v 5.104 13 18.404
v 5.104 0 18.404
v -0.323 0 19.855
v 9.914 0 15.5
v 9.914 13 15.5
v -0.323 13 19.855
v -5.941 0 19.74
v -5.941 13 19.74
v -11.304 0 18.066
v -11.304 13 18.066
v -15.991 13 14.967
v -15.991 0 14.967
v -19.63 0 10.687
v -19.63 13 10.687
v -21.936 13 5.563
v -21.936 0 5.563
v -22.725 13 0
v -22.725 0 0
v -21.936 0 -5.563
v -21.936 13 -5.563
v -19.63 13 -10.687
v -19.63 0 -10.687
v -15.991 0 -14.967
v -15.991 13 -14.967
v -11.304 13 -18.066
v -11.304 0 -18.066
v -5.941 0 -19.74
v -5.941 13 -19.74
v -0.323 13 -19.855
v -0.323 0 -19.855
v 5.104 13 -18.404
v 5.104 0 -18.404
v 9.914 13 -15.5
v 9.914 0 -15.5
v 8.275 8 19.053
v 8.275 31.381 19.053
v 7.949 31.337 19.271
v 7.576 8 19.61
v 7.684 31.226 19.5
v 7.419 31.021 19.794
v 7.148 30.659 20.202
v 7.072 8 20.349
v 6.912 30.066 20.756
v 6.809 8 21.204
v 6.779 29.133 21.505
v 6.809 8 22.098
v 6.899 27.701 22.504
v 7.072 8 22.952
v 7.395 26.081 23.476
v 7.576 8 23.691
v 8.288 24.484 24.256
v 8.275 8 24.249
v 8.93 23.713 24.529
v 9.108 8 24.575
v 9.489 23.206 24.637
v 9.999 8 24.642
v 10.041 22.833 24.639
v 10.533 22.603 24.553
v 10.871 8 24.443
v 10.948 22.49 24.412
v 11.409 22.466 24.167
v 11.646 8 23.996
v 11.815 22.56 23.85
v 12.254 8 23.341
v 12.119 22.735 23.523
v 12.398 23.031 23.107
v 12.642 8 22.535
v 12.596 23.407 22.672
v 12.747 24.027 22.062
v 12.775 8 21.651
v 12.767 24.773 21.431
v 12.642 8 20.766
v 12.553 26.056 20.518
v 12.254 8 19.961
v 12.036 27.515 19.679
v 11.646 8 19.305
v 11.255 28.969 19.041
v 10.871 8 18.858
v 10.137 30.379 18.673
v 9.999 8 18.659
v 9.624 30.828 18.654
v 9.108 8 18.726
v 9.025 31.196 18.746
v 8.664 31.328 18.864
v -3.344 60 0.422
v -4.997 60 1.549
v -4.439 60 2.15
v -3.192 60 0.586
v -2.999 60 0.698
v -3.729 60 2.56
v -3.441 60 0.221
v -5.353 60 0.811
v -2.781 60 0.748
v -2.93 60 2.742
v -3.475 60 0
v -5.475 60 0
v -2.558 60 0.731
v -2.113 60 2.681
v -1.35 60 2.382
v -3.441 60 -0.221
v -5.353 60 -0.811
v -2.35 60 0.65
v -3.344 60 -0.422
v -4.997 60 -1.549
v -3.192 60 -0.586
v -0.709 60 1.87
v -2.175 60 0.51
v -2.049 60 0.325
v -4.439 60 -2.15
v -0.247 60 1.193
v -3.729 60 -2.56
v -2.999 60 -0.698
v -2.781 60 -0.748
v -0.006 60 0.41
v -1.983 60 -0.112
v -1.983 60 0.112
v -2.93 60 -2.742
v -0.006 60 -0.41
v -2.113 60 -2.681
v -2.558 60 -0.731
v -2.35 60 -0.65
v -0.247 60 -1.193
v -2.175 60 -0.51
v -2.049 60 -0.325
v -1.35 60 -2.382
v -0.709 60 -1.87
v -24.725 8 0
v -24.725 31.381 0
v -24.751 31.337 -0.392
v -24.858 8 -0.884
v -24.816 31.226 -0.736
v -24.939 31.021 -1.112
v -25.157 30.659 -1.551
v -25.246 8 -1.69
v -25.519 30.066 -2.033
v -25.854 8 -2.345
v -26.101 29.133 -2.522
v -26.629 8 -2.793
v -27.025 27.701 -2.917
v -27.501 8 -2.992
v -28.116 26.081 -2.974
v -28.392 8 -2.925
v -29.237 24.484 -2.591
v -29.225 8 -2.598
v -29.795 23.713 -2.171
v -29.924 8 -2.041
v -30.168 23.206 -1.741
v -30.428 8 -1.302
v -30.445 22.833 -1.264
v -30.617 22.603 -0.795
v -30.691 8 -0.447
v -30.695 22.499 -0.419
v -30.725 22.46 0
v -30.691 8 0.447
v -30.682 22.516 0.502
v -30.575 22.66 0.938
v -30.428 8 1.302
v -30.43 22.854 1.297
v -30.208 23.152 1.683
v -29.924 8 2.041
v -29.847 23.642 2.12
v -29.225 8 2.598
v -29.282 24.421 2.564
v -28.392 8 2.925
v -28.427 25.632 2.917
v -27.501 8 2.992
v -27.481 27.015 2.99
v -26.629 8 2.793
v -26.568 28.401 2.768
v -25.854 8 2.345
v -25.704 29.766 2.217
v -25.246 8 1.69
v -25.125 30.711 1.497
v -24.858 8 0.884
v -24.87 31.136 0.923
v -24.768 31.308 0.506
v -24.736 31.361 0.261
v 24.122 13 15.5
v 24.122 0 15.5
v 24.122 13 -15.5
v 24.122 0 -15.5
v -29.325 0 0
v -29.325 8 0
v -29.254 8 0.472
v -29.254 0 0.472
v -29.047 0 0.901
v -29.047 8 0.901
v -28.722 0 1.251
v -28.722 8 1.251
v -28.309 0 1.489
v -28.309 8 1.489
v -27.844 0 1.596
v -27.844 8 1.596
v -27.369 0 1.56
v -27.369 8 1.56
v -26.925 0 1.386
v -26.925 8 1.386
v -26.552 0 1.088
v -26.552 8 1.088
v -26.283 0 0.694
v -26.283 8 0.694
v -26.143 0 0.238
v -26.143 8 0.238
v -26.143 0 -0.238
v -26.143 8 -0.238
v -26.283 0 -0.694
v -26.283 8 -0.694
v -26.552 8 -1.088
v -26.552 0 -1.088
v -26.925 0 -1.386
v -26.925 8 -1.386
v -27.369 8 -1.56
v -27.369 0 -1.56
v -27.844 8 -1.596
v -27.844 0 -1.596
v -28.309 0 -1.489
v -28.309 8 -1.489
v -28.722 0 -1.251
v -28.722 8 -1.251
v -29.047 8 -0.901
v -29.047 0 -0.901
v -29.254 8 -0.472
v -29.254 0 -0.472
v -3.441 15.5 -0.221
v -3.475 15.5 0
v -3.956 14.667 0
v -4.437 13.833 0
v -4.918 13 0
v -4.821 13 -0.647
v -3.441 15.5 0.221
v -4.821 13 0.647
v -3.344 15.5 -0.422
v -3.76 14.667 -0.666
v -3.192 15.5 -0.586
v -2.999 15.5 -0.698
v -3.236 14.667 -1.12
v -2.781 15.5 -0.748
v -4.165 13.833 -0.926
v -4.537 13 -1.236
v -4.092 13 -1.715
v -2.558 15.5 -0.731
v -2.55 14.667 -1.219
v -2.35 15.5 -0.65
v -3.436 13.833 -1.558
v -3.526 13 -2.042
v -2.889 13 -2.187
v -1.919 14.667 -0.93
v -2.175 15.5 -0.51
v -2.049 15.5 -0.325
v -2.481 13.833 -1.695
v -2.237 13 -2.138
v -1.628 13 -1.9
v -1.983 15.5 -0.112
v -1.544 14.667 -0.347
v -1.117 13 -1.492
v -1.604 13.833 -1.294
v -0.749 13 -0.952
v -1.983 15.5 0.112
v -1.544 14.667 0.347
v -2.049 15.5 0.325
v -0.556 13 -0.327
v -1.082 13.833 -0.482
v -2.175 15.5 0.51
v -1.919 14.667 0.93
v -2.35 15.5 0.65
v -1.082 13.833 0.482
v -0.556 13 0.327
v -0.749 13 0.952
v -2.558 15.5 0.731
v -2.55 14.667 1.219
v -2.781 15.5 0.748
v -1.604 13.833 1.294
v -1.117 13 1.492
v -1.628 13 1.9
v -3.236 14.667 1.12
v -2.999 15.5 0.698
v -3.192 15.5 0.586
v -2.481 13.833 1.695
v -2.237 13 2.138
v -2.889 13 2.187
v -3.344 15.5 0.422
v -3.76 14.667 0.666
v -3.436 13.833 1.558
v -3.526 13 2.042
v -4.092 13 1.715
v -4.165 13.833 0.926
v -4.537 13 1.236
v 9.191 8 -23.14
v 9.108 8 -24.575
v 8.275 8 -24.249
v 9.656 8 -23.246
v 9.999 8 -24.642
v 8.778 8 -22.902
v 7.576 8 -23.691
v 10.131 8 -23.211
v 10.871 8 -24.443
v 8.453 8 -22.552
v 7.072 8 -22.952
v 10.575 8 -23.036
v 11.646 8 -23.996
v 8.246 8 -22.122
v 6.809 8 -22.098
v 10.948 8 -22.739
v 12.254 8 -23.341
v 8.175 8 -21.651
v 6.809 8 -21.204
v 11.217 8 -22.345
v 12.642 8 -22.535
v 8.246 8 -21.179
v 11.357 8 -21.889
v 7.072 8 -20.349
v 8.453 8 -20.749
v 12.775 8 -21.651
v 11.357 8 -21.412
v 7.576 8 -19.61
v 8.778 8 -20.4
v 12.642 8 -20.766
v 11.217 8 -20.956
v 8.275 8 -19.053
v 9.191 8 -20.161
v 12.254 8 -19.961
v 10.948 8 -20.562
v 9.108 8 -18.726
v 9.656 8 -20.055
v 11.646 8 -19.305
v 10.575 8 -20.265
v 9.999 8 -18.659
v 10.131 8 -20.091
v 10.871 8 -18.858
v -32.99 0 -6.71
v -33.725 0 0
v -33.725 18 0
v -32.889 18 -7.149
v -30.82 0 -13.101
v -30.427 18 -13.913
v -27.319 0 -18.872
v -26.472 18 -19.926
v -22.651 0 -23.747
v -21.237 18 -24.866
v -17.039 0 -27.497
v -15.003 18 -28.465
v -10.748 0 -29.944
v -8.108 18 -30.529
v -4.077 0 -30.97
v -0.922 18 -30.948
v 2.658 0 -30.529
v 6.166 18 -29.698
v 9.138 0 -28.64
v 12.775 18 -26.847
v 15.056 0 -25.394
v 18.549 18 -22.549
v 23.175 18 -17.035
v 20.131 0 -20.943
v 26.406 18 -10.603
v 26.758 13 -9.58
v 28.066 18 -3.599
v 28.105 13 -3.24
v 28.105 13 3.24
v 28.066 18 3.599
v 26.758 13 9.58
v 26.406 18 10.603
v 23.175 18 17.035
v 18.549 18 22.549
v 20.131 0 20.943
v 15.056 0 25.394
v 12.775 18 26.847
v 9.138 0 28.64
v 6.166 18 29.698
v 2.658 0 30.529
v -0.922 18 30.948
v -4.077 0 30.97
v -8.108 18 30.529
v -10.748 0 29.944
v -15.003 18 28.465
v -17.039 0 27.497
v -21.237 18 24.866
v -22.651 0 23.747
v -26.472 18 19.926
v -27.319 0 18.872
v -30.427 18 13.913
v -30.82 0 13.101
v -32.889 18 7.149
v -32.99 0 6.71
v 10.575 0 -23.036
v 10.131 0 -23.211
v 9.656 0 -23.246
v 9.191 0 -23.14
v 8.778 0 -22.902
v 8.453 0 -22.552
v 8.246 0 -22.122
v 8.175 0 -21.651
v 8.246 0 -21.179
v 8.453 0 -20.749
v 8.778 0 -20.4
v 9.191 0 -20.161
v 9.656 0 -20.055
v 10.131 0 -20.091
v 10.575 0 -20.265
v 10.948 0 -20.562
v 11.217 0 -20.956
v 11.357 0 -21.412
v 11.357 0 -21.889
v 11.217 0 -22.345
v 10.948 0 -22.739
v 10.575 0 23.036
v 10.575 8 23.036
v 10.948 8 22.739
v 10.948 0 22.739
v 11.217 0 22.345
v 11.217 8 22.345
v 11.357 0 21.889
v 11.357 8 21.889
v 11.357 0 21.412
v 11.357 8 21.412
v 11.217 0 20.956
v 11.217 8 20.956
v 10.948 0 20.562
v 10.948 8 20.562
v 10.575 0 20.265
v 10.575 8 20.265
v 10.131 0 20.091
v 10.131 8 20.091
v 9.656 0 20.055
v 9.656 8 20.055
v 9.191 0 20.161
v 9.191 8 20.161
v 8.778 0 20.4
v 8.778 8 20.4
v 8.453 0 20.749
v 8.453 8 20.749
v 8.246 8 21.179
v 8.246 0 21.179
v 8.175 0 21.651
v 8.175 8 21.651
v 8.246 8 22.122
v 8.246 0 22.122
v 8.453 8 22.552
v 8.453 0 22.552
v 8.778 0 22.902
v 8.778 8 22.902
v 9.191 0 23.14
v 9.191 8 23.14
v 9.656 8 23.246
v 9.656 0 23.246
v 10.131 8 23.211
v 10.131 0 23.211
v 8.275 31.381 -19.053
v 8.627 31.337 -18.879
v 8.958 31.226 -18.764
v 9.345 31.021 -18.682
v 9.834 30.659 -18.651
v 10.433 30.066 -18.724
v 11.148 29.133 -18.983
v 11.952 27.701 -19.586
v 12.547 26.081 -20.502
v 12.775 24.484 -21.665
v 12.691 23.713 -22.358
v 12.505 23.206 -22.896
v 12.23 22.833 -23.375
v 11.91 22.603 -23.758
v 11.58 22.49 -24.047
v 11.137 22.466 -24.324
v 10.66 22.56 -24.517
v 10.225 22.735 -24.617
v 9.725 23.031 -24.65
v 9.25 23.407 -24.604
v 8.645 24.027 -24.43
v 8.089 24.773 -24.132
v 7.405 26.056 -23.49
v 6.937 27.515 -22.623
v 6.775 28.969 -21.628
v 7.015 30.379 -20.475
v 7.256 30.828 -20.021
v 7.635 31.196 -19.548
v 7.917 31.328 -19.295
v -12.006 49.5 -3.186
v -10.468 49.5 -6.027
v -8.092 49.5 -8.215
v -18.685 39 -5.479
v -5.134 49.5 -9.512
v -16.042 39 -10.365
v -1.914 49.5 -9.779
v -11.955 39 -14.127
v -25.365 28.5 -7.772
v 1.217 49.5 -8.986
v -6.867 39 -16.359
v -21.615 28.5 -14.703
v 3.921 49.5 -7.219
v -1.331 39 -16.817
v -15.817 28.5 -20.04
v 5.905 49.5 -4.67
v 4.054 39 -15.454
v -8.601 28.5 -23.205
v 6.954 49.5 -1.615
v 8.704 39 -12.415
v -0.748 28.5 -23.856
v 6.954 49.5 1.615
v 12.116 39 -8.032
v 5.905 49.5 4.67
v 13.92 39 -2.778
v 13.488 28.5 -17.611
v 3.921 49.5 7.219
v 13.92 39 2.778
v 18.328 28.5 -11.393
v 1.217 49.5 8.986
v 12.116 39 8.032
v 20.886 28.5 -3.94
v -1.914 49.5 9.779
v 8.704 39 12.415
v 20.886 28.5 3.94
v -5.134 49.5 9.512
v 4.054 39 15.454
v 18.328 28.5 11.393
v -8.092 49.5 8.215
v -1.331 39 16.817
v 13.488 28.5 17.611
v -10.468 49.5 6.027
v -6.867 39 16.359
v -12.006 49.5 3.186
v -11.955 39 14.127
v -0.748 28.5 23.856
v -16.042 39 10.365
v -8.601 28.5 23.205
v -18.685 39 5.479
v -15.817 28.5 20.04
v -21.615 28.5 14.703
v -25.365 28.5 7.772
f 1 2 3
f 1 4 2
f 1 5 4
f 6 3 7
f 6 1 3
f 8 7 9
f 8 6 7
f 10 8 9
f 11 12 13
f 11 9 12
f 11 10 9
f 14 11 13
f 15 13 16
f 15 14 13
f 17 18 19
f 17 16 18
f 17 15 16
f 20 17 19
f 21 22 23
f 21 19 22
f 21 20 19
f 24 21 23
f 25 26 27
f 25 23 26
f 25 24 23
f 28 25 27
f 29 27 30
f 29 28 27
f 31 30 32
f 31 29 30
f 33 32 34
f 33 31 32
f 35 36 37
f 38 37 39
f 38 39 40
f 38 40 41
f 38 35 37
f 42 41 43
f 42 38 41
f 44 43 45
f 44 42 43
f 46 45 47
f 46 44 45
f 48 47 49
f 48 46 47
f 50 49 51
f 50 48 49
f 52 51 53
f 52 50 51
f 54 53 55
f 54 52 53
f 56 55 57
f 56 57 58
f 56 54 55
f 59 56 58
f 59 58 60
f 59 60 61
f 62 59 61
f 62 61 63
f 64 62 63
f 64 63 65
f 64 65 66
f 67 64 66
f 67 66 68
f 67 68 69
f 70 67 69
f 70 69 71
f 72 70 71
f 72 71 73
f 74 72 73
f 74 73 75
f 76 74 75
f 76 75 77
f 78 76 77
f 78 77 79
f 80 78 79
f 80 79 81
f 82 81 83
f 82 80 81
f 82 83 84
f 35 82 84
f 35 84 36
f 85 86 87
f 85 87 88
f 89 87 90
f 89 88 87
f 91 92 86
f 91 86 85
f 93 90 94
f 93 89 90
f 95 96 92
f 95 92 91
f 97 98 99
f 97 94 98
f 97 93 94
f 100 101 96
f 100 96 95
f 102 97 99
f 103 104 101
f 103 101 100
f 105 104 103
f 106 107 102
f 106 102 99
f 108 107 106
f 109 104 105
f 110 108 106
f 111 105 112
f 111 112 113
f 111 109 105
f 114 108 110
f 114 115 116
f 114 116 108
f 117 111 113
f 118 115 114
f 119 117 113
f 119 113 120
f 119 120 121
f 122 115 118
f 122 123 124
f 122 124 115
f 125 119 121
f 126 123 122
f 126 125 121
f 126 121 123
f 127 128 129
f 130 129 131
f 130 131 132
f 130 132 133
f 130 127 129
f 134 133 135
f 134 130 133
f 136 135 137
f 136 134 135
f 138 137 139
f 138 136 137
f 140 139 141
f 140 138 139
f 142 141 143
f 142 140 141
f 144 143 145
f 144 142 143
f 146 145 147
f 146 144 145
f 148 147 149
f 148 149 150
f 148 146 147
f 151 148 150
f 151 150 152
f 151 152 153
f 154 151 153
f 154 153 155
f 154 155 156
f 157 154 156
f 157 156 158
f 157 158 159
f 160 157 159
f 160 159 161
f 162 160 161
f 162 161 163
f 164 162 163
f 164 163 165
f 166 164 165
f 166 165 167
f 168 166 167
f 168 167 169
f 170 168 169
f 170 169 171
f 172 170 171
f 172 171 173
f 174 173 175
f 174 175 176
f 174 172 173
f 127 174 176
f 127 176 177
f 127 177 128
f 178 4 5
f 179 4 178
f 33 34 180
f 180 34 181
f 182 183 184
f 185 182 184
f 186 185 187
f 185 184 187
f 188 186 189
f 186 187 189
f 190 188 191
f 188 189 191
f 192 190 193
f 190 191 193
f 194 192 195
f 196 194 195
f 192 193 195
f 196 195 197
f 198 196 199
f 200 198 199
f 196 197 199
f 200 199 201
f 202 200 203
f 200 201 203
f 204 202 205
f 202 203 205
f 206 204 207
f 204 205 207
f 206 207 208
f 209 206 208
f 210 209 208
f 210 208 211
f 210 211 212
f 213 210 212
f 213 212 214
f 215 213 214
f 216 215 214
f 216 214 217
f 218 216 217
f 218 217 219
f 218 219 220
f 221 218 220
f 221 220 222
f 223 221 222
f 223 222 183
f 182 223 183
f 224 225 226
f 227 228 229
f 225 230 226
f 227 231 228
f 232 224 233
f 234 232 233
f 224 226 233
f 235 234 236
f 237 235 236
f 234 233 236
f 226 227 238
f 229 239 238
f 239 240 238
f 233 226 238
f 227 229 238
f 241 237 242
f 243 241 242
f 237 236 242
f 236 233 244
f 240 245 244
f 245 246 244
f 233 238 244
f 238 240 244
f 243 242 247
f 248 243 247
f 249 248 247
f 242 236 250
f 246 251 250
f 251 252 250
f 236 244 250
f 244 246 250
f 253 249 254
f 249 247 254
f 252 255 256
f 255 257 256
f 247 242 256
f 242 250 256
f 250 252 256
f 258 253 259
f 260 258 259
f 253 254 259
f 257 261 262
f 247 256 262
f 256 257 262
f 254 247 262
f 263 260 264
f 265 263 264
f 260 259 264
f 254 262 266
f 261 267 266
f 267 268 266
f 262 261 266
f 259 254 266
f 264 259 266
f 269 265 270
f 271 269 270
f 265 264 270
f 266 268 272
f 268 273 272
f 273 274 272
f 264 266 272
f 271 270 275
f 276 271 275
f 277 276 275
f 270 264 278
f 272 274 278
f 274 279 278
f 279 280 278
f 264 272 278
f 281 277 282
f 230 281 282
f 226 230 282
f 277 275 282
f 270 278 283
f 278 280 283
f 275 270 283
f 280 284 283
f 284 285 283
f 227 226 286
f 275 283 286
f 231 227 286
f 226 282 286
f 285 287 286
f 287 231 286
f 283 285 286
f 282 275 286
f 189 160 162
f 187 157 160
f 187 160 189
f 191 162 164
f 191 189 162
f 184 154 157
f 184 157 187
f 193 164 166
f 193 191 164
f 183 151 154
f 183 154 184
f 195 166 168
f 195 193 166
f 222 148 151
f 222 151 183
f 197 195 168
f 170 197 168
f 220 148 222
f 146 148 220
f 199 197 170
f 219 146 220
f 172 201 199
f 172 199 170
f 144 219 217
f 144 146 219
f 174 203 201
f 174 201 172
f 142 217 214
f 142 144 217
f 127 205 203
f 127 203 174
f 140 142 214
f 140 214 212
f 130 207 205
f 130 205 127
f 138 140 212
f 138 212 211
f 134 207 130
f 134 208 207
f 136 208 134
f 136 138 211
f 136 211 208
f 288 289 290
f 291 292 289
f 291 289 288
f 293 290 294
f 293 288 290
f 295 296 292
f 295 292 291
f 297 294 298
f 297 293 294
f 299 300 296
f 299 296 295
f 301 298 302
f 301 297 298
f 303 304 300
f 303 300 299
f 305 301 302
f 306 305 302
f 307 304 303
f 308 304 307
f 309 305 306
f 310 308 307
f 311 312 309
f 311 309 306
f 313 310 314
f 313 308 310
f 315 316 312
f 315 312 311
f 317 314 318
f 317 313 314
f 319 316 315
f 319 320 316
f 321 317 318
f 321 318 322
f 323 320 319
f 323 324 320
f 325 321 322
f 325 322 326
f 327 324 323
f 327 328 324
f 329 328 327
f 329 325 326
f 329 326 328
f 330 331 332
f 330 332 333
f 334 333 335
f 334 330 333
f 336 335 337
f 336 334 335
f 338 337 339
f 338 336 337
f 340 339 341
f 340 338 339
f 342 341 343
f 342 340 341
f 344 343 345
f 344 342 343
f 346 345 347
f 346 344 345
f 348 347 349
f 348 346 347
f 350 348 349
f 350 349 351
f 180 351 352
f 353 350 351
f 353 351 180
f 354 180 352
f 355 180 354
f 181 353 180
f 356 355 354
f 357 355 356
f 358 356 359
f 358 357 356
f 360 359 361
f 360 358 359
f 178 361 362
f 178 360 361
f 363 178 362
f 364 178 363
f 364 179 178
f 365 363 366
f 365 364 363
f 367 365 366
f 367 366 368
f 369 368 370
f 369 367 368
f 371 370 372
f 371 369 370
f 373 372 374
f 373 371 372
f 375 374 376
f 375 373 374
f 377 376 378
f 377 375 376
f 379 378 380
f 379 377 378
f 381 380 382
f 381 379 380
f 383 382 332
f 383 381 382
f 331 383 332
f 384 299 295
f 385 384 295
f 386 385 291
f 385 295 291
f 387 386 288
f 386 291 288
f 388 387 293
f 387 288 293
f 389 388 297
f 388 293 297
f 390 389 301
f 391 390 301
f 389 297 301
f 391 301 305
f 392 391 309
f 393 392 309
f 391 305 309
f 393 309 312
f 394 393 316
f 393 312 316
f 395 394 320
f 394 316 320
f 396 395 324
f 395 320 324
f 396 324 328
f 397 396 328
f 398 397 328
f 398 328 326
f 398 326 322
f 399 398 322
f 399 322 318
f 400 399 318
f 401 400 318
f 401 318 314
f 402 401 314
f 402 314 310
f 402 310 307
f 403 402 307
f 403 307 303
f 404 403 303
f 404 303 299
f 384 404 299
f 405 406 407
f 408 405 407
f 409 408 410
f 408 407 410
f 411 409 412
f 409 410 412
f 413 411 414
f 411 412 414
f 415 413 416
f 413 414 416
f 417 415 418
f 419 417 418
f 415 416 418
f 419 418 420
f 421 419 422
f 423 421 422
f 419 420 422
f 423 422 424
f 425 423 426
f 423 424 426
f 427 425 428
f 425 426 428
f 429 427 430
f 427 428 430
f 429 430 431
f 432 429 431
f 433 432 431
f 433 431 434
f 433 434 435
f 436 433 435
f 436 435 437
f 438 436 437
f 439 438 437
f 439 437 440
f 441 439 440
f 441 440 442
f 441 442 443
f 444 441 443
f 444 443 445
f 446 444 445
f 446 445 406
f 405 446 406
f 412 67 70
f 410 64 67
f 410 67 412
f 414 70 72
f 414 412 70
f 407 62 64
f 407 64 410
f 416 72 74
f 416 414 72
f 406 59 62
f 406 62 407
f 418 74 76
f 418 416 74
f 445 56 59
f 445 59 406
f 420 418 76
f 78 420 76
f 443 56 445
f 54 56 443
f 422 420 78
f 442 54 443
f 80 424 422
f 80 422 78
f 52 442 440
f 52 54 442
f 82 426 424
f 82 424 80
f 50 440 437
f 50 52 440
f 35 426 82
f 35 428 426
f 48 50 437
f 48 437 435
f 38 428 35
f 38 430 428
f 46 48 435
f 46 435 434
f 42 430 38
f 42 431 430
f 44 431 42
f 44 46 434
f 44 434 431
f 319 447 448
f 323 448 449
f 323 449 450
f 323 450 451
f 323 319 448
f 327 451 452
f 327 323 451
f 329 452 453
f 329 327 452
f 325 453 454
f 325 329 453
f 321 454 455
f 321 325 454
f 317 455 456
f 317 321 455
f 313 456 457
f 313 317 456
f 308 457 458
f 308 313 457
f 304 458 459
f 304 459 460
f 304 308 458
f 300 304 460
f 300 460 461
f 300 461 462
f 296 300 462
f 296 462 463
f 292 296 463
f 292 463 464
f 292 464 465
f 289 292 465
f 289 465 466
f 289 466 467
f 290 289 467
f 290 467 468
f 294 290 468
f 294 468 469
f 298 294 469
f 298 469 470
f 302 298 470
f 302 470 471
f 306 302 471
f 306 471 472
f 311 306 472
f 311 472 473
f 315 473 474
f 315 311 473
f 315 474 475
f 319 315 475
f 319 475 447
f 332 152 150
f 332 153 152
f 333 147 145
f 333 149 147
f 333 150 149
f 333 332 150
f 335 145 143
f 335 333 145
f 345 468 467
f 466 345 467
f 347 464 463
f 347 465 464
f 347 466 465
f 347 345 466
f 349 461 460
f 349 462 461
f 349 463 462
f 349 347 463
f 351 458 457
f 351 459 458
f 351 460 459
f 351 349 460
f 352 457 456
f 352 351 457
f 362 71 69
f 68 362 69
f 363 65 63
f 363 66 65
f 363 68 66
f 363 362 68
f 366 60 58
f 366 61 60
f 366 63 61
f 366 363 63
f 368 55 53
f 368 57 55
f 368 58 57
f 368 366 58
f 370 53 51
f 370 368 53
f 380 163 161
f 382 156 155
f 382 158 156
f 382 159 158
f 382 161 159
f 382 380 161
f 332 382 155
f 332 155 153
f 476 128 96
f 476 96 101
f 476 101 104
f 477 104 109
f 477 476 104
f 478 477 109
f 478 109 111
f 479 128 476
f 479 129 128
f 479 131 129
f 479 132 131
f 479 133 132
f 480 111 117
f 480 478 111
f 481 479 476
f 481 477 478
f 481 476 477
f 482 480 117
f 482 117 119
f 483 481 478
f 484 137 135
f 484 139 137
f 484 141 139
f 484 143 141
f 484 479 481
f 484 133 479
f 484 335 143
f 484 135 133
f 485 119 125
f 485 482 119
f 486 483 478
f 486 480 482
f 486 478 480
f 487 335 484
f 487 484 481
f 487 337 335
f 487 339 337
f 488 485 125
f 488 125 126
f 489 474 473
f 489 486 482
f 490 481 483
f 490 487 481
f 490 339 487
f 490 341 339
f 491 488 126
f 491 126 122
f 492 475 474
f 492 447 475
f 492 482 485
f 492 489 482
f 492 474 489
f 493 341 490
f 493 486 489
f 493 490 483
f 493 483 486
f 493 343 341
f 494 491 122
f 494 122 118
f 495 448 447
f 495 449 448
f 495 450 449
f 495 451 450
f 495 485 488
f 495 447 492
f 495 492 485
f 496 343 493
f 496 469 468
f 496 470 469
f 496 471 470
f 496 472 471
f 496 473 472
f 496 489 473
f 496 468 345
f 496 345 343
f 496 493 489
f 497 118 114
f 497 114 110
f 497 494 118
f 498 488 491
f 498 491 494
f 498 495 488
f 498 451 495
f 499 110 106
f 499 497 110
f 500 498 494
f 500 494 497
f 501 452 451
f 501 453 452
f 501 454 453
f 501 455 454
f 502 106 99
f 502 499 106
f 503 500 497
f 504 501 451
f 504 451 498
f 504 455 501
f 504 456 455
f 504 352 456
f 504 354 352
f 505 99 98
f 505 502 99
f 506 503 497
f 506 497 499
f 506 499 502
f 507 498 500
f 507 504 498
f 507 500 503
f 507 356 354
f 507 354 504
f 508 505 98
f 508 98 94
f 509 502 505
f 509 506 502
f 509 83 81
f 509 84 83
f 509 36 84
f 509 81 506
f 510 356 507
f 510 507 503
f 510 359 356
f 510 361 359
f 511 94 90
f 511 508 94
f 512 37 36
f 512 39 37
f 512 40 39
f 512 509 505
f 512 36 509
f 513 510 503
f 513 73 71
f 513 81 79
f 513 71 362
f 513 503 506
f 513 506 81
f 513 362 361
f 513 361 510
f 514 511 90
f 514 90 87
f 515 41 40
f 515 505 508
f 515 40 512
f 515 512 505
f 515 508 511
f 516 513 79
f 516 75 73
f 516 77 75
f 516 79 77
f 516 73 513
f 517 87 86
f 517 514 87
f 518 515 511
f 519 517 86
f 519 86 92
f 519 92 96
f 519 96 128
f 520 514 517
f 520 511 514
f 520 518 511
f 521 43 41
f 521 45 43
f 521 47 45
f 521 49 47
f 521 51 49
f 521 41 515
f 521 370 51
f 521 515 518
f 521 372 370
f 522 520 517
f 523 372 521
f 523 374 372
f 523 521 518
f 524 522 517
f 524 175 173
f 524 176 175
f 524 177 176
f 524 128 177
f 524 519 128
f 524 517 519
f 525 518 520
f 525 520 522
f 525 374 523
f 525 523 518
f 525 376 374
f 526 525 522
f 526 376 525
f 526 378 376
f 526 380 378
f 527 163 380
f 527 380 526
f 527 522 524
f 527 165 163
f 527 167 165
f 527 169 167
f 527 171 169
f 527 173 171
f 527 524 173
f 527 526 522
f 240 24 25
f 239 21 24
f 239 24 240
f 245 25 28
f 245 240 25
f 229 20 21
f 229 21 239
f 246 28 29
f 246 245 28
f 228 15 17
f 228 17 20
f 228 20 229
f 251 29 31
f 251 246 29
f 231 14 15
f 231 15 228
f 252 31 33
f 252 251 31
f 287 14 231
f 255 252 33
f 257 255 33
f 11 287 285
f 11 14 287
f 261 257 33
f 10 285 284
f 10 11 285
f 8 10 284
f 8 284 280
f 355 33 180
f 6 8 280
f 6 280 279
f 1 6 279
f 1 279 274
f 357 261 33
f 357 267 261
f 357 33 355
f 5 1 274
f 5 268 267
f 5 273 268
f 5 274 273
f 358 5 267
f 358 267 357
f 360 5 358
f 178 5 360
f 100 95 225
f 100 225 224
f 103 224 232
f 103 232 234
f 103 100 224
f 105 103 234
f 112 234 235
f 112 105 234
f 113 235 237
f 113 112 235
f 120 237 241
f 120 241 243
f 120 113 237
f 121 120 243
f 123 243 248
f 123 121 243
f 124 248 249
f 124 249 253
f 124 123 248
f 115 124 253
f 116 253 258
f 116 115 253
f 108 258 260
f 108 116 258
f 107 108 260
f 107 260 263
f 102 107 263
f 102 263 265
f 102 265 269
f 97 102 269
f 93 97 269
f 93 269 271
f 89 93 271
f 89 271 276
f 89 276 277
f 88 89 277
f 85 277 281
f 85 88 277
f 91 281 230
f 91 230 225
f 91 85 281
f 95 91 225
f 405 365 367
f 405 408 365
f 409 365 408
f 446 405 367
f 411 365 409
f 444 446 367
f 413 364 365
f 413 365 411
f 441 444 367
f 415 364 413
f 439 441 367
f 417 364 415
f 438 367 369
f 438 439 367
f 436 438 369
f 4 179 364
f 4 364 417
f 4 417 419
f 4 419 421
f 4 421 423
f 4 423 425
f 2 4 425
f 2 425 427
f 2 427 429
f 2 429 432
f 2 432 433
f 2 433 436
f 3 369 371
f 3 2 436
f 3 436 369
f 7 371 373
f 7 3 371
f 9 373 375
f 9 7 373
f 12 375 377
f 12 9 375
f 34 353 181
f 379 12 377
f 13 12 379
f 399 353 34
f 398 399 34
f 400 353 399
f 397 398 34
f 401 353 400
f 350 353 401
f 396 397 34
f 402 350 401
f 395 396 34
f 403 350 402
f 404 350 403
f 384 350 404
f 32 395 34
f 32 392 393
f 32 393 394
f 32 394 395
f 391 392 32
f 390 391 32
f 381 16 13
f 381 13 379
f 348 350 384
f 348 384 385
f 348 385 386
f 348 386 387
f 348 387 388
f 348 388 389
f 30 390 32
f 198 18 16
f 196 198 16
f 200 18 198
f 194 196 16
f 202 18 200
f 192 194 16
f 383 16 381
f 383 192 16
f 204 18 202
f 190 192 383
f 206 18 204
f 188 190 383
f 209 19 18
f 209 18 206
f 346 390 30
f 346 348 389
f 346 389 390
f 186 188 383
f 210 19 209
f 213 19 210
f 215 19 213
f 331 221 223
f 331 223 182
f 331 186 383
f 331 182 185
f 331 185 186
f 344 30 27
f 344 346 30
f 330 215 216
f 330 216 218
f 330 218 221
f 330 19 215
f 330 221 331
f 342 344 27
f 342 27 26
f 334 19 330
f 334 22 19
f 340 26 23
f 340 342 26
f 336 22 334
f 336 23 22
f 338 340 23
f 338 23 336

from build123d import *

# Parameters (mm, degrees)
SKETCH2_W          = 40.136410409
SKETCH2_H          = 31
CUT_EXTRUDE1_DEPTH = 13
CUT_EXTRUDE3_START = -10
SKETCH4_R          = 3
CUT_EXTRUDE3_DEPTH = 73.147907447
SKETCH5_R          = 1.6
CUT_EXTRUDE4_DEPTH = 70.299079528
CIRPATTERN1_COUNT  = 3
CHAMFER1_SIZE      = 2.5
CHAMFER1_SIZE2     = 1.443375673


with BuildPart() as part:
    # Sketch1 → Revolve1 (revolve)
    with BuildSketch(Plane.XY):
        Polygon((-5.474803929, 60), (-33.724803929, 18), (-33.724803929, 0), (-22.724803929, 0), (-22.724803929, 13), (-3.474803929, 13), (-3.474803929, 60), align=None)
    revolve(axis=Axis((-2.724803929, 66.831705954, 0), (0, -1, 0)))

    # Sketch2 → Cut-Extrude1 (cut)
    with BuildSketch(Plane.XZ):
        with Locations((24.032962091, 0)):
            Rectangle(SKETCH2_W, SKETCH2_H)
    extrude(amount=-CUT_EXTRUDE1_DEPTH, mode=Mode.SUBTRACT)

    # Sketch4 → Cut-Extrude3 (cut)
    with BuildSketch(Plane(origin=(0, 18, 0), x_dir=(-1, 0, 0), z_dir=(0, 1, 0)).offset(CUT_EXTRUDE3_START)):
        with Locations(Location((27.724803929, 0, 0), (0, 0, 179.999995067))):
            Circle(SKETCH4_R)
    cut_extrude3 = extrude(amount=CUT_EXTRUDE3_DEPTH, mode=Mode.SUBTRACT)

    # Sketch5 → Cut-Extrude4 (cut, through all)
    with BuildSketch(Plane(origin=(0, 8, 0), x_dir=(1, 0, 0), z_dir=(0, 1, 0))):
        with Locations(Location((-27.724803929, 0, 0), (0, 0, 180))):
            Circle(SKETCH5_R)
    cut_extrude4 = extrude(amount=-CUT_EXTRUDE4_DEPTH, mode=Mode.SUBTRACT)

    # CirPattern1: Cut-Extrude3, Cut-Extrude4 ×3 about axis
    cirpattern1_axis = Axis((-2.724803929, 0, 0), (0, 1, 0))
    add([cut_extrude3.rotate(cirpattern1_axis, i * 360 / CIRPATTERN1_COUNT) for i in range(1, CIRPATTERN1_COUNT)], mode=Mode.SUBTRACT)
    add([cut_extrude4.rotate(cirpattern1_axis, i * 360 / CIRPATTERN1_COUNT) for i in range(1, CIRPATTERN1_COUNT)], mode=Mode.SUBTRACT)

    # Chamfer1
    chamfer1_edges = [part.edges().sort_by_distance(p)[0] for p in [
        (-1.974803929, 13, 0),
    ]]
    chamfer1_side = [part.faces().sort_by_distance(p)[0] for p in [
        (-1.974803929, 36.5, 0),
    ]]
    chamfer(chamfer1_edges, length=CHAMFER1_SIZE, length2=CHAMFER1_SIZE2, reference=chamfer1_side[0])


solid = part.part
